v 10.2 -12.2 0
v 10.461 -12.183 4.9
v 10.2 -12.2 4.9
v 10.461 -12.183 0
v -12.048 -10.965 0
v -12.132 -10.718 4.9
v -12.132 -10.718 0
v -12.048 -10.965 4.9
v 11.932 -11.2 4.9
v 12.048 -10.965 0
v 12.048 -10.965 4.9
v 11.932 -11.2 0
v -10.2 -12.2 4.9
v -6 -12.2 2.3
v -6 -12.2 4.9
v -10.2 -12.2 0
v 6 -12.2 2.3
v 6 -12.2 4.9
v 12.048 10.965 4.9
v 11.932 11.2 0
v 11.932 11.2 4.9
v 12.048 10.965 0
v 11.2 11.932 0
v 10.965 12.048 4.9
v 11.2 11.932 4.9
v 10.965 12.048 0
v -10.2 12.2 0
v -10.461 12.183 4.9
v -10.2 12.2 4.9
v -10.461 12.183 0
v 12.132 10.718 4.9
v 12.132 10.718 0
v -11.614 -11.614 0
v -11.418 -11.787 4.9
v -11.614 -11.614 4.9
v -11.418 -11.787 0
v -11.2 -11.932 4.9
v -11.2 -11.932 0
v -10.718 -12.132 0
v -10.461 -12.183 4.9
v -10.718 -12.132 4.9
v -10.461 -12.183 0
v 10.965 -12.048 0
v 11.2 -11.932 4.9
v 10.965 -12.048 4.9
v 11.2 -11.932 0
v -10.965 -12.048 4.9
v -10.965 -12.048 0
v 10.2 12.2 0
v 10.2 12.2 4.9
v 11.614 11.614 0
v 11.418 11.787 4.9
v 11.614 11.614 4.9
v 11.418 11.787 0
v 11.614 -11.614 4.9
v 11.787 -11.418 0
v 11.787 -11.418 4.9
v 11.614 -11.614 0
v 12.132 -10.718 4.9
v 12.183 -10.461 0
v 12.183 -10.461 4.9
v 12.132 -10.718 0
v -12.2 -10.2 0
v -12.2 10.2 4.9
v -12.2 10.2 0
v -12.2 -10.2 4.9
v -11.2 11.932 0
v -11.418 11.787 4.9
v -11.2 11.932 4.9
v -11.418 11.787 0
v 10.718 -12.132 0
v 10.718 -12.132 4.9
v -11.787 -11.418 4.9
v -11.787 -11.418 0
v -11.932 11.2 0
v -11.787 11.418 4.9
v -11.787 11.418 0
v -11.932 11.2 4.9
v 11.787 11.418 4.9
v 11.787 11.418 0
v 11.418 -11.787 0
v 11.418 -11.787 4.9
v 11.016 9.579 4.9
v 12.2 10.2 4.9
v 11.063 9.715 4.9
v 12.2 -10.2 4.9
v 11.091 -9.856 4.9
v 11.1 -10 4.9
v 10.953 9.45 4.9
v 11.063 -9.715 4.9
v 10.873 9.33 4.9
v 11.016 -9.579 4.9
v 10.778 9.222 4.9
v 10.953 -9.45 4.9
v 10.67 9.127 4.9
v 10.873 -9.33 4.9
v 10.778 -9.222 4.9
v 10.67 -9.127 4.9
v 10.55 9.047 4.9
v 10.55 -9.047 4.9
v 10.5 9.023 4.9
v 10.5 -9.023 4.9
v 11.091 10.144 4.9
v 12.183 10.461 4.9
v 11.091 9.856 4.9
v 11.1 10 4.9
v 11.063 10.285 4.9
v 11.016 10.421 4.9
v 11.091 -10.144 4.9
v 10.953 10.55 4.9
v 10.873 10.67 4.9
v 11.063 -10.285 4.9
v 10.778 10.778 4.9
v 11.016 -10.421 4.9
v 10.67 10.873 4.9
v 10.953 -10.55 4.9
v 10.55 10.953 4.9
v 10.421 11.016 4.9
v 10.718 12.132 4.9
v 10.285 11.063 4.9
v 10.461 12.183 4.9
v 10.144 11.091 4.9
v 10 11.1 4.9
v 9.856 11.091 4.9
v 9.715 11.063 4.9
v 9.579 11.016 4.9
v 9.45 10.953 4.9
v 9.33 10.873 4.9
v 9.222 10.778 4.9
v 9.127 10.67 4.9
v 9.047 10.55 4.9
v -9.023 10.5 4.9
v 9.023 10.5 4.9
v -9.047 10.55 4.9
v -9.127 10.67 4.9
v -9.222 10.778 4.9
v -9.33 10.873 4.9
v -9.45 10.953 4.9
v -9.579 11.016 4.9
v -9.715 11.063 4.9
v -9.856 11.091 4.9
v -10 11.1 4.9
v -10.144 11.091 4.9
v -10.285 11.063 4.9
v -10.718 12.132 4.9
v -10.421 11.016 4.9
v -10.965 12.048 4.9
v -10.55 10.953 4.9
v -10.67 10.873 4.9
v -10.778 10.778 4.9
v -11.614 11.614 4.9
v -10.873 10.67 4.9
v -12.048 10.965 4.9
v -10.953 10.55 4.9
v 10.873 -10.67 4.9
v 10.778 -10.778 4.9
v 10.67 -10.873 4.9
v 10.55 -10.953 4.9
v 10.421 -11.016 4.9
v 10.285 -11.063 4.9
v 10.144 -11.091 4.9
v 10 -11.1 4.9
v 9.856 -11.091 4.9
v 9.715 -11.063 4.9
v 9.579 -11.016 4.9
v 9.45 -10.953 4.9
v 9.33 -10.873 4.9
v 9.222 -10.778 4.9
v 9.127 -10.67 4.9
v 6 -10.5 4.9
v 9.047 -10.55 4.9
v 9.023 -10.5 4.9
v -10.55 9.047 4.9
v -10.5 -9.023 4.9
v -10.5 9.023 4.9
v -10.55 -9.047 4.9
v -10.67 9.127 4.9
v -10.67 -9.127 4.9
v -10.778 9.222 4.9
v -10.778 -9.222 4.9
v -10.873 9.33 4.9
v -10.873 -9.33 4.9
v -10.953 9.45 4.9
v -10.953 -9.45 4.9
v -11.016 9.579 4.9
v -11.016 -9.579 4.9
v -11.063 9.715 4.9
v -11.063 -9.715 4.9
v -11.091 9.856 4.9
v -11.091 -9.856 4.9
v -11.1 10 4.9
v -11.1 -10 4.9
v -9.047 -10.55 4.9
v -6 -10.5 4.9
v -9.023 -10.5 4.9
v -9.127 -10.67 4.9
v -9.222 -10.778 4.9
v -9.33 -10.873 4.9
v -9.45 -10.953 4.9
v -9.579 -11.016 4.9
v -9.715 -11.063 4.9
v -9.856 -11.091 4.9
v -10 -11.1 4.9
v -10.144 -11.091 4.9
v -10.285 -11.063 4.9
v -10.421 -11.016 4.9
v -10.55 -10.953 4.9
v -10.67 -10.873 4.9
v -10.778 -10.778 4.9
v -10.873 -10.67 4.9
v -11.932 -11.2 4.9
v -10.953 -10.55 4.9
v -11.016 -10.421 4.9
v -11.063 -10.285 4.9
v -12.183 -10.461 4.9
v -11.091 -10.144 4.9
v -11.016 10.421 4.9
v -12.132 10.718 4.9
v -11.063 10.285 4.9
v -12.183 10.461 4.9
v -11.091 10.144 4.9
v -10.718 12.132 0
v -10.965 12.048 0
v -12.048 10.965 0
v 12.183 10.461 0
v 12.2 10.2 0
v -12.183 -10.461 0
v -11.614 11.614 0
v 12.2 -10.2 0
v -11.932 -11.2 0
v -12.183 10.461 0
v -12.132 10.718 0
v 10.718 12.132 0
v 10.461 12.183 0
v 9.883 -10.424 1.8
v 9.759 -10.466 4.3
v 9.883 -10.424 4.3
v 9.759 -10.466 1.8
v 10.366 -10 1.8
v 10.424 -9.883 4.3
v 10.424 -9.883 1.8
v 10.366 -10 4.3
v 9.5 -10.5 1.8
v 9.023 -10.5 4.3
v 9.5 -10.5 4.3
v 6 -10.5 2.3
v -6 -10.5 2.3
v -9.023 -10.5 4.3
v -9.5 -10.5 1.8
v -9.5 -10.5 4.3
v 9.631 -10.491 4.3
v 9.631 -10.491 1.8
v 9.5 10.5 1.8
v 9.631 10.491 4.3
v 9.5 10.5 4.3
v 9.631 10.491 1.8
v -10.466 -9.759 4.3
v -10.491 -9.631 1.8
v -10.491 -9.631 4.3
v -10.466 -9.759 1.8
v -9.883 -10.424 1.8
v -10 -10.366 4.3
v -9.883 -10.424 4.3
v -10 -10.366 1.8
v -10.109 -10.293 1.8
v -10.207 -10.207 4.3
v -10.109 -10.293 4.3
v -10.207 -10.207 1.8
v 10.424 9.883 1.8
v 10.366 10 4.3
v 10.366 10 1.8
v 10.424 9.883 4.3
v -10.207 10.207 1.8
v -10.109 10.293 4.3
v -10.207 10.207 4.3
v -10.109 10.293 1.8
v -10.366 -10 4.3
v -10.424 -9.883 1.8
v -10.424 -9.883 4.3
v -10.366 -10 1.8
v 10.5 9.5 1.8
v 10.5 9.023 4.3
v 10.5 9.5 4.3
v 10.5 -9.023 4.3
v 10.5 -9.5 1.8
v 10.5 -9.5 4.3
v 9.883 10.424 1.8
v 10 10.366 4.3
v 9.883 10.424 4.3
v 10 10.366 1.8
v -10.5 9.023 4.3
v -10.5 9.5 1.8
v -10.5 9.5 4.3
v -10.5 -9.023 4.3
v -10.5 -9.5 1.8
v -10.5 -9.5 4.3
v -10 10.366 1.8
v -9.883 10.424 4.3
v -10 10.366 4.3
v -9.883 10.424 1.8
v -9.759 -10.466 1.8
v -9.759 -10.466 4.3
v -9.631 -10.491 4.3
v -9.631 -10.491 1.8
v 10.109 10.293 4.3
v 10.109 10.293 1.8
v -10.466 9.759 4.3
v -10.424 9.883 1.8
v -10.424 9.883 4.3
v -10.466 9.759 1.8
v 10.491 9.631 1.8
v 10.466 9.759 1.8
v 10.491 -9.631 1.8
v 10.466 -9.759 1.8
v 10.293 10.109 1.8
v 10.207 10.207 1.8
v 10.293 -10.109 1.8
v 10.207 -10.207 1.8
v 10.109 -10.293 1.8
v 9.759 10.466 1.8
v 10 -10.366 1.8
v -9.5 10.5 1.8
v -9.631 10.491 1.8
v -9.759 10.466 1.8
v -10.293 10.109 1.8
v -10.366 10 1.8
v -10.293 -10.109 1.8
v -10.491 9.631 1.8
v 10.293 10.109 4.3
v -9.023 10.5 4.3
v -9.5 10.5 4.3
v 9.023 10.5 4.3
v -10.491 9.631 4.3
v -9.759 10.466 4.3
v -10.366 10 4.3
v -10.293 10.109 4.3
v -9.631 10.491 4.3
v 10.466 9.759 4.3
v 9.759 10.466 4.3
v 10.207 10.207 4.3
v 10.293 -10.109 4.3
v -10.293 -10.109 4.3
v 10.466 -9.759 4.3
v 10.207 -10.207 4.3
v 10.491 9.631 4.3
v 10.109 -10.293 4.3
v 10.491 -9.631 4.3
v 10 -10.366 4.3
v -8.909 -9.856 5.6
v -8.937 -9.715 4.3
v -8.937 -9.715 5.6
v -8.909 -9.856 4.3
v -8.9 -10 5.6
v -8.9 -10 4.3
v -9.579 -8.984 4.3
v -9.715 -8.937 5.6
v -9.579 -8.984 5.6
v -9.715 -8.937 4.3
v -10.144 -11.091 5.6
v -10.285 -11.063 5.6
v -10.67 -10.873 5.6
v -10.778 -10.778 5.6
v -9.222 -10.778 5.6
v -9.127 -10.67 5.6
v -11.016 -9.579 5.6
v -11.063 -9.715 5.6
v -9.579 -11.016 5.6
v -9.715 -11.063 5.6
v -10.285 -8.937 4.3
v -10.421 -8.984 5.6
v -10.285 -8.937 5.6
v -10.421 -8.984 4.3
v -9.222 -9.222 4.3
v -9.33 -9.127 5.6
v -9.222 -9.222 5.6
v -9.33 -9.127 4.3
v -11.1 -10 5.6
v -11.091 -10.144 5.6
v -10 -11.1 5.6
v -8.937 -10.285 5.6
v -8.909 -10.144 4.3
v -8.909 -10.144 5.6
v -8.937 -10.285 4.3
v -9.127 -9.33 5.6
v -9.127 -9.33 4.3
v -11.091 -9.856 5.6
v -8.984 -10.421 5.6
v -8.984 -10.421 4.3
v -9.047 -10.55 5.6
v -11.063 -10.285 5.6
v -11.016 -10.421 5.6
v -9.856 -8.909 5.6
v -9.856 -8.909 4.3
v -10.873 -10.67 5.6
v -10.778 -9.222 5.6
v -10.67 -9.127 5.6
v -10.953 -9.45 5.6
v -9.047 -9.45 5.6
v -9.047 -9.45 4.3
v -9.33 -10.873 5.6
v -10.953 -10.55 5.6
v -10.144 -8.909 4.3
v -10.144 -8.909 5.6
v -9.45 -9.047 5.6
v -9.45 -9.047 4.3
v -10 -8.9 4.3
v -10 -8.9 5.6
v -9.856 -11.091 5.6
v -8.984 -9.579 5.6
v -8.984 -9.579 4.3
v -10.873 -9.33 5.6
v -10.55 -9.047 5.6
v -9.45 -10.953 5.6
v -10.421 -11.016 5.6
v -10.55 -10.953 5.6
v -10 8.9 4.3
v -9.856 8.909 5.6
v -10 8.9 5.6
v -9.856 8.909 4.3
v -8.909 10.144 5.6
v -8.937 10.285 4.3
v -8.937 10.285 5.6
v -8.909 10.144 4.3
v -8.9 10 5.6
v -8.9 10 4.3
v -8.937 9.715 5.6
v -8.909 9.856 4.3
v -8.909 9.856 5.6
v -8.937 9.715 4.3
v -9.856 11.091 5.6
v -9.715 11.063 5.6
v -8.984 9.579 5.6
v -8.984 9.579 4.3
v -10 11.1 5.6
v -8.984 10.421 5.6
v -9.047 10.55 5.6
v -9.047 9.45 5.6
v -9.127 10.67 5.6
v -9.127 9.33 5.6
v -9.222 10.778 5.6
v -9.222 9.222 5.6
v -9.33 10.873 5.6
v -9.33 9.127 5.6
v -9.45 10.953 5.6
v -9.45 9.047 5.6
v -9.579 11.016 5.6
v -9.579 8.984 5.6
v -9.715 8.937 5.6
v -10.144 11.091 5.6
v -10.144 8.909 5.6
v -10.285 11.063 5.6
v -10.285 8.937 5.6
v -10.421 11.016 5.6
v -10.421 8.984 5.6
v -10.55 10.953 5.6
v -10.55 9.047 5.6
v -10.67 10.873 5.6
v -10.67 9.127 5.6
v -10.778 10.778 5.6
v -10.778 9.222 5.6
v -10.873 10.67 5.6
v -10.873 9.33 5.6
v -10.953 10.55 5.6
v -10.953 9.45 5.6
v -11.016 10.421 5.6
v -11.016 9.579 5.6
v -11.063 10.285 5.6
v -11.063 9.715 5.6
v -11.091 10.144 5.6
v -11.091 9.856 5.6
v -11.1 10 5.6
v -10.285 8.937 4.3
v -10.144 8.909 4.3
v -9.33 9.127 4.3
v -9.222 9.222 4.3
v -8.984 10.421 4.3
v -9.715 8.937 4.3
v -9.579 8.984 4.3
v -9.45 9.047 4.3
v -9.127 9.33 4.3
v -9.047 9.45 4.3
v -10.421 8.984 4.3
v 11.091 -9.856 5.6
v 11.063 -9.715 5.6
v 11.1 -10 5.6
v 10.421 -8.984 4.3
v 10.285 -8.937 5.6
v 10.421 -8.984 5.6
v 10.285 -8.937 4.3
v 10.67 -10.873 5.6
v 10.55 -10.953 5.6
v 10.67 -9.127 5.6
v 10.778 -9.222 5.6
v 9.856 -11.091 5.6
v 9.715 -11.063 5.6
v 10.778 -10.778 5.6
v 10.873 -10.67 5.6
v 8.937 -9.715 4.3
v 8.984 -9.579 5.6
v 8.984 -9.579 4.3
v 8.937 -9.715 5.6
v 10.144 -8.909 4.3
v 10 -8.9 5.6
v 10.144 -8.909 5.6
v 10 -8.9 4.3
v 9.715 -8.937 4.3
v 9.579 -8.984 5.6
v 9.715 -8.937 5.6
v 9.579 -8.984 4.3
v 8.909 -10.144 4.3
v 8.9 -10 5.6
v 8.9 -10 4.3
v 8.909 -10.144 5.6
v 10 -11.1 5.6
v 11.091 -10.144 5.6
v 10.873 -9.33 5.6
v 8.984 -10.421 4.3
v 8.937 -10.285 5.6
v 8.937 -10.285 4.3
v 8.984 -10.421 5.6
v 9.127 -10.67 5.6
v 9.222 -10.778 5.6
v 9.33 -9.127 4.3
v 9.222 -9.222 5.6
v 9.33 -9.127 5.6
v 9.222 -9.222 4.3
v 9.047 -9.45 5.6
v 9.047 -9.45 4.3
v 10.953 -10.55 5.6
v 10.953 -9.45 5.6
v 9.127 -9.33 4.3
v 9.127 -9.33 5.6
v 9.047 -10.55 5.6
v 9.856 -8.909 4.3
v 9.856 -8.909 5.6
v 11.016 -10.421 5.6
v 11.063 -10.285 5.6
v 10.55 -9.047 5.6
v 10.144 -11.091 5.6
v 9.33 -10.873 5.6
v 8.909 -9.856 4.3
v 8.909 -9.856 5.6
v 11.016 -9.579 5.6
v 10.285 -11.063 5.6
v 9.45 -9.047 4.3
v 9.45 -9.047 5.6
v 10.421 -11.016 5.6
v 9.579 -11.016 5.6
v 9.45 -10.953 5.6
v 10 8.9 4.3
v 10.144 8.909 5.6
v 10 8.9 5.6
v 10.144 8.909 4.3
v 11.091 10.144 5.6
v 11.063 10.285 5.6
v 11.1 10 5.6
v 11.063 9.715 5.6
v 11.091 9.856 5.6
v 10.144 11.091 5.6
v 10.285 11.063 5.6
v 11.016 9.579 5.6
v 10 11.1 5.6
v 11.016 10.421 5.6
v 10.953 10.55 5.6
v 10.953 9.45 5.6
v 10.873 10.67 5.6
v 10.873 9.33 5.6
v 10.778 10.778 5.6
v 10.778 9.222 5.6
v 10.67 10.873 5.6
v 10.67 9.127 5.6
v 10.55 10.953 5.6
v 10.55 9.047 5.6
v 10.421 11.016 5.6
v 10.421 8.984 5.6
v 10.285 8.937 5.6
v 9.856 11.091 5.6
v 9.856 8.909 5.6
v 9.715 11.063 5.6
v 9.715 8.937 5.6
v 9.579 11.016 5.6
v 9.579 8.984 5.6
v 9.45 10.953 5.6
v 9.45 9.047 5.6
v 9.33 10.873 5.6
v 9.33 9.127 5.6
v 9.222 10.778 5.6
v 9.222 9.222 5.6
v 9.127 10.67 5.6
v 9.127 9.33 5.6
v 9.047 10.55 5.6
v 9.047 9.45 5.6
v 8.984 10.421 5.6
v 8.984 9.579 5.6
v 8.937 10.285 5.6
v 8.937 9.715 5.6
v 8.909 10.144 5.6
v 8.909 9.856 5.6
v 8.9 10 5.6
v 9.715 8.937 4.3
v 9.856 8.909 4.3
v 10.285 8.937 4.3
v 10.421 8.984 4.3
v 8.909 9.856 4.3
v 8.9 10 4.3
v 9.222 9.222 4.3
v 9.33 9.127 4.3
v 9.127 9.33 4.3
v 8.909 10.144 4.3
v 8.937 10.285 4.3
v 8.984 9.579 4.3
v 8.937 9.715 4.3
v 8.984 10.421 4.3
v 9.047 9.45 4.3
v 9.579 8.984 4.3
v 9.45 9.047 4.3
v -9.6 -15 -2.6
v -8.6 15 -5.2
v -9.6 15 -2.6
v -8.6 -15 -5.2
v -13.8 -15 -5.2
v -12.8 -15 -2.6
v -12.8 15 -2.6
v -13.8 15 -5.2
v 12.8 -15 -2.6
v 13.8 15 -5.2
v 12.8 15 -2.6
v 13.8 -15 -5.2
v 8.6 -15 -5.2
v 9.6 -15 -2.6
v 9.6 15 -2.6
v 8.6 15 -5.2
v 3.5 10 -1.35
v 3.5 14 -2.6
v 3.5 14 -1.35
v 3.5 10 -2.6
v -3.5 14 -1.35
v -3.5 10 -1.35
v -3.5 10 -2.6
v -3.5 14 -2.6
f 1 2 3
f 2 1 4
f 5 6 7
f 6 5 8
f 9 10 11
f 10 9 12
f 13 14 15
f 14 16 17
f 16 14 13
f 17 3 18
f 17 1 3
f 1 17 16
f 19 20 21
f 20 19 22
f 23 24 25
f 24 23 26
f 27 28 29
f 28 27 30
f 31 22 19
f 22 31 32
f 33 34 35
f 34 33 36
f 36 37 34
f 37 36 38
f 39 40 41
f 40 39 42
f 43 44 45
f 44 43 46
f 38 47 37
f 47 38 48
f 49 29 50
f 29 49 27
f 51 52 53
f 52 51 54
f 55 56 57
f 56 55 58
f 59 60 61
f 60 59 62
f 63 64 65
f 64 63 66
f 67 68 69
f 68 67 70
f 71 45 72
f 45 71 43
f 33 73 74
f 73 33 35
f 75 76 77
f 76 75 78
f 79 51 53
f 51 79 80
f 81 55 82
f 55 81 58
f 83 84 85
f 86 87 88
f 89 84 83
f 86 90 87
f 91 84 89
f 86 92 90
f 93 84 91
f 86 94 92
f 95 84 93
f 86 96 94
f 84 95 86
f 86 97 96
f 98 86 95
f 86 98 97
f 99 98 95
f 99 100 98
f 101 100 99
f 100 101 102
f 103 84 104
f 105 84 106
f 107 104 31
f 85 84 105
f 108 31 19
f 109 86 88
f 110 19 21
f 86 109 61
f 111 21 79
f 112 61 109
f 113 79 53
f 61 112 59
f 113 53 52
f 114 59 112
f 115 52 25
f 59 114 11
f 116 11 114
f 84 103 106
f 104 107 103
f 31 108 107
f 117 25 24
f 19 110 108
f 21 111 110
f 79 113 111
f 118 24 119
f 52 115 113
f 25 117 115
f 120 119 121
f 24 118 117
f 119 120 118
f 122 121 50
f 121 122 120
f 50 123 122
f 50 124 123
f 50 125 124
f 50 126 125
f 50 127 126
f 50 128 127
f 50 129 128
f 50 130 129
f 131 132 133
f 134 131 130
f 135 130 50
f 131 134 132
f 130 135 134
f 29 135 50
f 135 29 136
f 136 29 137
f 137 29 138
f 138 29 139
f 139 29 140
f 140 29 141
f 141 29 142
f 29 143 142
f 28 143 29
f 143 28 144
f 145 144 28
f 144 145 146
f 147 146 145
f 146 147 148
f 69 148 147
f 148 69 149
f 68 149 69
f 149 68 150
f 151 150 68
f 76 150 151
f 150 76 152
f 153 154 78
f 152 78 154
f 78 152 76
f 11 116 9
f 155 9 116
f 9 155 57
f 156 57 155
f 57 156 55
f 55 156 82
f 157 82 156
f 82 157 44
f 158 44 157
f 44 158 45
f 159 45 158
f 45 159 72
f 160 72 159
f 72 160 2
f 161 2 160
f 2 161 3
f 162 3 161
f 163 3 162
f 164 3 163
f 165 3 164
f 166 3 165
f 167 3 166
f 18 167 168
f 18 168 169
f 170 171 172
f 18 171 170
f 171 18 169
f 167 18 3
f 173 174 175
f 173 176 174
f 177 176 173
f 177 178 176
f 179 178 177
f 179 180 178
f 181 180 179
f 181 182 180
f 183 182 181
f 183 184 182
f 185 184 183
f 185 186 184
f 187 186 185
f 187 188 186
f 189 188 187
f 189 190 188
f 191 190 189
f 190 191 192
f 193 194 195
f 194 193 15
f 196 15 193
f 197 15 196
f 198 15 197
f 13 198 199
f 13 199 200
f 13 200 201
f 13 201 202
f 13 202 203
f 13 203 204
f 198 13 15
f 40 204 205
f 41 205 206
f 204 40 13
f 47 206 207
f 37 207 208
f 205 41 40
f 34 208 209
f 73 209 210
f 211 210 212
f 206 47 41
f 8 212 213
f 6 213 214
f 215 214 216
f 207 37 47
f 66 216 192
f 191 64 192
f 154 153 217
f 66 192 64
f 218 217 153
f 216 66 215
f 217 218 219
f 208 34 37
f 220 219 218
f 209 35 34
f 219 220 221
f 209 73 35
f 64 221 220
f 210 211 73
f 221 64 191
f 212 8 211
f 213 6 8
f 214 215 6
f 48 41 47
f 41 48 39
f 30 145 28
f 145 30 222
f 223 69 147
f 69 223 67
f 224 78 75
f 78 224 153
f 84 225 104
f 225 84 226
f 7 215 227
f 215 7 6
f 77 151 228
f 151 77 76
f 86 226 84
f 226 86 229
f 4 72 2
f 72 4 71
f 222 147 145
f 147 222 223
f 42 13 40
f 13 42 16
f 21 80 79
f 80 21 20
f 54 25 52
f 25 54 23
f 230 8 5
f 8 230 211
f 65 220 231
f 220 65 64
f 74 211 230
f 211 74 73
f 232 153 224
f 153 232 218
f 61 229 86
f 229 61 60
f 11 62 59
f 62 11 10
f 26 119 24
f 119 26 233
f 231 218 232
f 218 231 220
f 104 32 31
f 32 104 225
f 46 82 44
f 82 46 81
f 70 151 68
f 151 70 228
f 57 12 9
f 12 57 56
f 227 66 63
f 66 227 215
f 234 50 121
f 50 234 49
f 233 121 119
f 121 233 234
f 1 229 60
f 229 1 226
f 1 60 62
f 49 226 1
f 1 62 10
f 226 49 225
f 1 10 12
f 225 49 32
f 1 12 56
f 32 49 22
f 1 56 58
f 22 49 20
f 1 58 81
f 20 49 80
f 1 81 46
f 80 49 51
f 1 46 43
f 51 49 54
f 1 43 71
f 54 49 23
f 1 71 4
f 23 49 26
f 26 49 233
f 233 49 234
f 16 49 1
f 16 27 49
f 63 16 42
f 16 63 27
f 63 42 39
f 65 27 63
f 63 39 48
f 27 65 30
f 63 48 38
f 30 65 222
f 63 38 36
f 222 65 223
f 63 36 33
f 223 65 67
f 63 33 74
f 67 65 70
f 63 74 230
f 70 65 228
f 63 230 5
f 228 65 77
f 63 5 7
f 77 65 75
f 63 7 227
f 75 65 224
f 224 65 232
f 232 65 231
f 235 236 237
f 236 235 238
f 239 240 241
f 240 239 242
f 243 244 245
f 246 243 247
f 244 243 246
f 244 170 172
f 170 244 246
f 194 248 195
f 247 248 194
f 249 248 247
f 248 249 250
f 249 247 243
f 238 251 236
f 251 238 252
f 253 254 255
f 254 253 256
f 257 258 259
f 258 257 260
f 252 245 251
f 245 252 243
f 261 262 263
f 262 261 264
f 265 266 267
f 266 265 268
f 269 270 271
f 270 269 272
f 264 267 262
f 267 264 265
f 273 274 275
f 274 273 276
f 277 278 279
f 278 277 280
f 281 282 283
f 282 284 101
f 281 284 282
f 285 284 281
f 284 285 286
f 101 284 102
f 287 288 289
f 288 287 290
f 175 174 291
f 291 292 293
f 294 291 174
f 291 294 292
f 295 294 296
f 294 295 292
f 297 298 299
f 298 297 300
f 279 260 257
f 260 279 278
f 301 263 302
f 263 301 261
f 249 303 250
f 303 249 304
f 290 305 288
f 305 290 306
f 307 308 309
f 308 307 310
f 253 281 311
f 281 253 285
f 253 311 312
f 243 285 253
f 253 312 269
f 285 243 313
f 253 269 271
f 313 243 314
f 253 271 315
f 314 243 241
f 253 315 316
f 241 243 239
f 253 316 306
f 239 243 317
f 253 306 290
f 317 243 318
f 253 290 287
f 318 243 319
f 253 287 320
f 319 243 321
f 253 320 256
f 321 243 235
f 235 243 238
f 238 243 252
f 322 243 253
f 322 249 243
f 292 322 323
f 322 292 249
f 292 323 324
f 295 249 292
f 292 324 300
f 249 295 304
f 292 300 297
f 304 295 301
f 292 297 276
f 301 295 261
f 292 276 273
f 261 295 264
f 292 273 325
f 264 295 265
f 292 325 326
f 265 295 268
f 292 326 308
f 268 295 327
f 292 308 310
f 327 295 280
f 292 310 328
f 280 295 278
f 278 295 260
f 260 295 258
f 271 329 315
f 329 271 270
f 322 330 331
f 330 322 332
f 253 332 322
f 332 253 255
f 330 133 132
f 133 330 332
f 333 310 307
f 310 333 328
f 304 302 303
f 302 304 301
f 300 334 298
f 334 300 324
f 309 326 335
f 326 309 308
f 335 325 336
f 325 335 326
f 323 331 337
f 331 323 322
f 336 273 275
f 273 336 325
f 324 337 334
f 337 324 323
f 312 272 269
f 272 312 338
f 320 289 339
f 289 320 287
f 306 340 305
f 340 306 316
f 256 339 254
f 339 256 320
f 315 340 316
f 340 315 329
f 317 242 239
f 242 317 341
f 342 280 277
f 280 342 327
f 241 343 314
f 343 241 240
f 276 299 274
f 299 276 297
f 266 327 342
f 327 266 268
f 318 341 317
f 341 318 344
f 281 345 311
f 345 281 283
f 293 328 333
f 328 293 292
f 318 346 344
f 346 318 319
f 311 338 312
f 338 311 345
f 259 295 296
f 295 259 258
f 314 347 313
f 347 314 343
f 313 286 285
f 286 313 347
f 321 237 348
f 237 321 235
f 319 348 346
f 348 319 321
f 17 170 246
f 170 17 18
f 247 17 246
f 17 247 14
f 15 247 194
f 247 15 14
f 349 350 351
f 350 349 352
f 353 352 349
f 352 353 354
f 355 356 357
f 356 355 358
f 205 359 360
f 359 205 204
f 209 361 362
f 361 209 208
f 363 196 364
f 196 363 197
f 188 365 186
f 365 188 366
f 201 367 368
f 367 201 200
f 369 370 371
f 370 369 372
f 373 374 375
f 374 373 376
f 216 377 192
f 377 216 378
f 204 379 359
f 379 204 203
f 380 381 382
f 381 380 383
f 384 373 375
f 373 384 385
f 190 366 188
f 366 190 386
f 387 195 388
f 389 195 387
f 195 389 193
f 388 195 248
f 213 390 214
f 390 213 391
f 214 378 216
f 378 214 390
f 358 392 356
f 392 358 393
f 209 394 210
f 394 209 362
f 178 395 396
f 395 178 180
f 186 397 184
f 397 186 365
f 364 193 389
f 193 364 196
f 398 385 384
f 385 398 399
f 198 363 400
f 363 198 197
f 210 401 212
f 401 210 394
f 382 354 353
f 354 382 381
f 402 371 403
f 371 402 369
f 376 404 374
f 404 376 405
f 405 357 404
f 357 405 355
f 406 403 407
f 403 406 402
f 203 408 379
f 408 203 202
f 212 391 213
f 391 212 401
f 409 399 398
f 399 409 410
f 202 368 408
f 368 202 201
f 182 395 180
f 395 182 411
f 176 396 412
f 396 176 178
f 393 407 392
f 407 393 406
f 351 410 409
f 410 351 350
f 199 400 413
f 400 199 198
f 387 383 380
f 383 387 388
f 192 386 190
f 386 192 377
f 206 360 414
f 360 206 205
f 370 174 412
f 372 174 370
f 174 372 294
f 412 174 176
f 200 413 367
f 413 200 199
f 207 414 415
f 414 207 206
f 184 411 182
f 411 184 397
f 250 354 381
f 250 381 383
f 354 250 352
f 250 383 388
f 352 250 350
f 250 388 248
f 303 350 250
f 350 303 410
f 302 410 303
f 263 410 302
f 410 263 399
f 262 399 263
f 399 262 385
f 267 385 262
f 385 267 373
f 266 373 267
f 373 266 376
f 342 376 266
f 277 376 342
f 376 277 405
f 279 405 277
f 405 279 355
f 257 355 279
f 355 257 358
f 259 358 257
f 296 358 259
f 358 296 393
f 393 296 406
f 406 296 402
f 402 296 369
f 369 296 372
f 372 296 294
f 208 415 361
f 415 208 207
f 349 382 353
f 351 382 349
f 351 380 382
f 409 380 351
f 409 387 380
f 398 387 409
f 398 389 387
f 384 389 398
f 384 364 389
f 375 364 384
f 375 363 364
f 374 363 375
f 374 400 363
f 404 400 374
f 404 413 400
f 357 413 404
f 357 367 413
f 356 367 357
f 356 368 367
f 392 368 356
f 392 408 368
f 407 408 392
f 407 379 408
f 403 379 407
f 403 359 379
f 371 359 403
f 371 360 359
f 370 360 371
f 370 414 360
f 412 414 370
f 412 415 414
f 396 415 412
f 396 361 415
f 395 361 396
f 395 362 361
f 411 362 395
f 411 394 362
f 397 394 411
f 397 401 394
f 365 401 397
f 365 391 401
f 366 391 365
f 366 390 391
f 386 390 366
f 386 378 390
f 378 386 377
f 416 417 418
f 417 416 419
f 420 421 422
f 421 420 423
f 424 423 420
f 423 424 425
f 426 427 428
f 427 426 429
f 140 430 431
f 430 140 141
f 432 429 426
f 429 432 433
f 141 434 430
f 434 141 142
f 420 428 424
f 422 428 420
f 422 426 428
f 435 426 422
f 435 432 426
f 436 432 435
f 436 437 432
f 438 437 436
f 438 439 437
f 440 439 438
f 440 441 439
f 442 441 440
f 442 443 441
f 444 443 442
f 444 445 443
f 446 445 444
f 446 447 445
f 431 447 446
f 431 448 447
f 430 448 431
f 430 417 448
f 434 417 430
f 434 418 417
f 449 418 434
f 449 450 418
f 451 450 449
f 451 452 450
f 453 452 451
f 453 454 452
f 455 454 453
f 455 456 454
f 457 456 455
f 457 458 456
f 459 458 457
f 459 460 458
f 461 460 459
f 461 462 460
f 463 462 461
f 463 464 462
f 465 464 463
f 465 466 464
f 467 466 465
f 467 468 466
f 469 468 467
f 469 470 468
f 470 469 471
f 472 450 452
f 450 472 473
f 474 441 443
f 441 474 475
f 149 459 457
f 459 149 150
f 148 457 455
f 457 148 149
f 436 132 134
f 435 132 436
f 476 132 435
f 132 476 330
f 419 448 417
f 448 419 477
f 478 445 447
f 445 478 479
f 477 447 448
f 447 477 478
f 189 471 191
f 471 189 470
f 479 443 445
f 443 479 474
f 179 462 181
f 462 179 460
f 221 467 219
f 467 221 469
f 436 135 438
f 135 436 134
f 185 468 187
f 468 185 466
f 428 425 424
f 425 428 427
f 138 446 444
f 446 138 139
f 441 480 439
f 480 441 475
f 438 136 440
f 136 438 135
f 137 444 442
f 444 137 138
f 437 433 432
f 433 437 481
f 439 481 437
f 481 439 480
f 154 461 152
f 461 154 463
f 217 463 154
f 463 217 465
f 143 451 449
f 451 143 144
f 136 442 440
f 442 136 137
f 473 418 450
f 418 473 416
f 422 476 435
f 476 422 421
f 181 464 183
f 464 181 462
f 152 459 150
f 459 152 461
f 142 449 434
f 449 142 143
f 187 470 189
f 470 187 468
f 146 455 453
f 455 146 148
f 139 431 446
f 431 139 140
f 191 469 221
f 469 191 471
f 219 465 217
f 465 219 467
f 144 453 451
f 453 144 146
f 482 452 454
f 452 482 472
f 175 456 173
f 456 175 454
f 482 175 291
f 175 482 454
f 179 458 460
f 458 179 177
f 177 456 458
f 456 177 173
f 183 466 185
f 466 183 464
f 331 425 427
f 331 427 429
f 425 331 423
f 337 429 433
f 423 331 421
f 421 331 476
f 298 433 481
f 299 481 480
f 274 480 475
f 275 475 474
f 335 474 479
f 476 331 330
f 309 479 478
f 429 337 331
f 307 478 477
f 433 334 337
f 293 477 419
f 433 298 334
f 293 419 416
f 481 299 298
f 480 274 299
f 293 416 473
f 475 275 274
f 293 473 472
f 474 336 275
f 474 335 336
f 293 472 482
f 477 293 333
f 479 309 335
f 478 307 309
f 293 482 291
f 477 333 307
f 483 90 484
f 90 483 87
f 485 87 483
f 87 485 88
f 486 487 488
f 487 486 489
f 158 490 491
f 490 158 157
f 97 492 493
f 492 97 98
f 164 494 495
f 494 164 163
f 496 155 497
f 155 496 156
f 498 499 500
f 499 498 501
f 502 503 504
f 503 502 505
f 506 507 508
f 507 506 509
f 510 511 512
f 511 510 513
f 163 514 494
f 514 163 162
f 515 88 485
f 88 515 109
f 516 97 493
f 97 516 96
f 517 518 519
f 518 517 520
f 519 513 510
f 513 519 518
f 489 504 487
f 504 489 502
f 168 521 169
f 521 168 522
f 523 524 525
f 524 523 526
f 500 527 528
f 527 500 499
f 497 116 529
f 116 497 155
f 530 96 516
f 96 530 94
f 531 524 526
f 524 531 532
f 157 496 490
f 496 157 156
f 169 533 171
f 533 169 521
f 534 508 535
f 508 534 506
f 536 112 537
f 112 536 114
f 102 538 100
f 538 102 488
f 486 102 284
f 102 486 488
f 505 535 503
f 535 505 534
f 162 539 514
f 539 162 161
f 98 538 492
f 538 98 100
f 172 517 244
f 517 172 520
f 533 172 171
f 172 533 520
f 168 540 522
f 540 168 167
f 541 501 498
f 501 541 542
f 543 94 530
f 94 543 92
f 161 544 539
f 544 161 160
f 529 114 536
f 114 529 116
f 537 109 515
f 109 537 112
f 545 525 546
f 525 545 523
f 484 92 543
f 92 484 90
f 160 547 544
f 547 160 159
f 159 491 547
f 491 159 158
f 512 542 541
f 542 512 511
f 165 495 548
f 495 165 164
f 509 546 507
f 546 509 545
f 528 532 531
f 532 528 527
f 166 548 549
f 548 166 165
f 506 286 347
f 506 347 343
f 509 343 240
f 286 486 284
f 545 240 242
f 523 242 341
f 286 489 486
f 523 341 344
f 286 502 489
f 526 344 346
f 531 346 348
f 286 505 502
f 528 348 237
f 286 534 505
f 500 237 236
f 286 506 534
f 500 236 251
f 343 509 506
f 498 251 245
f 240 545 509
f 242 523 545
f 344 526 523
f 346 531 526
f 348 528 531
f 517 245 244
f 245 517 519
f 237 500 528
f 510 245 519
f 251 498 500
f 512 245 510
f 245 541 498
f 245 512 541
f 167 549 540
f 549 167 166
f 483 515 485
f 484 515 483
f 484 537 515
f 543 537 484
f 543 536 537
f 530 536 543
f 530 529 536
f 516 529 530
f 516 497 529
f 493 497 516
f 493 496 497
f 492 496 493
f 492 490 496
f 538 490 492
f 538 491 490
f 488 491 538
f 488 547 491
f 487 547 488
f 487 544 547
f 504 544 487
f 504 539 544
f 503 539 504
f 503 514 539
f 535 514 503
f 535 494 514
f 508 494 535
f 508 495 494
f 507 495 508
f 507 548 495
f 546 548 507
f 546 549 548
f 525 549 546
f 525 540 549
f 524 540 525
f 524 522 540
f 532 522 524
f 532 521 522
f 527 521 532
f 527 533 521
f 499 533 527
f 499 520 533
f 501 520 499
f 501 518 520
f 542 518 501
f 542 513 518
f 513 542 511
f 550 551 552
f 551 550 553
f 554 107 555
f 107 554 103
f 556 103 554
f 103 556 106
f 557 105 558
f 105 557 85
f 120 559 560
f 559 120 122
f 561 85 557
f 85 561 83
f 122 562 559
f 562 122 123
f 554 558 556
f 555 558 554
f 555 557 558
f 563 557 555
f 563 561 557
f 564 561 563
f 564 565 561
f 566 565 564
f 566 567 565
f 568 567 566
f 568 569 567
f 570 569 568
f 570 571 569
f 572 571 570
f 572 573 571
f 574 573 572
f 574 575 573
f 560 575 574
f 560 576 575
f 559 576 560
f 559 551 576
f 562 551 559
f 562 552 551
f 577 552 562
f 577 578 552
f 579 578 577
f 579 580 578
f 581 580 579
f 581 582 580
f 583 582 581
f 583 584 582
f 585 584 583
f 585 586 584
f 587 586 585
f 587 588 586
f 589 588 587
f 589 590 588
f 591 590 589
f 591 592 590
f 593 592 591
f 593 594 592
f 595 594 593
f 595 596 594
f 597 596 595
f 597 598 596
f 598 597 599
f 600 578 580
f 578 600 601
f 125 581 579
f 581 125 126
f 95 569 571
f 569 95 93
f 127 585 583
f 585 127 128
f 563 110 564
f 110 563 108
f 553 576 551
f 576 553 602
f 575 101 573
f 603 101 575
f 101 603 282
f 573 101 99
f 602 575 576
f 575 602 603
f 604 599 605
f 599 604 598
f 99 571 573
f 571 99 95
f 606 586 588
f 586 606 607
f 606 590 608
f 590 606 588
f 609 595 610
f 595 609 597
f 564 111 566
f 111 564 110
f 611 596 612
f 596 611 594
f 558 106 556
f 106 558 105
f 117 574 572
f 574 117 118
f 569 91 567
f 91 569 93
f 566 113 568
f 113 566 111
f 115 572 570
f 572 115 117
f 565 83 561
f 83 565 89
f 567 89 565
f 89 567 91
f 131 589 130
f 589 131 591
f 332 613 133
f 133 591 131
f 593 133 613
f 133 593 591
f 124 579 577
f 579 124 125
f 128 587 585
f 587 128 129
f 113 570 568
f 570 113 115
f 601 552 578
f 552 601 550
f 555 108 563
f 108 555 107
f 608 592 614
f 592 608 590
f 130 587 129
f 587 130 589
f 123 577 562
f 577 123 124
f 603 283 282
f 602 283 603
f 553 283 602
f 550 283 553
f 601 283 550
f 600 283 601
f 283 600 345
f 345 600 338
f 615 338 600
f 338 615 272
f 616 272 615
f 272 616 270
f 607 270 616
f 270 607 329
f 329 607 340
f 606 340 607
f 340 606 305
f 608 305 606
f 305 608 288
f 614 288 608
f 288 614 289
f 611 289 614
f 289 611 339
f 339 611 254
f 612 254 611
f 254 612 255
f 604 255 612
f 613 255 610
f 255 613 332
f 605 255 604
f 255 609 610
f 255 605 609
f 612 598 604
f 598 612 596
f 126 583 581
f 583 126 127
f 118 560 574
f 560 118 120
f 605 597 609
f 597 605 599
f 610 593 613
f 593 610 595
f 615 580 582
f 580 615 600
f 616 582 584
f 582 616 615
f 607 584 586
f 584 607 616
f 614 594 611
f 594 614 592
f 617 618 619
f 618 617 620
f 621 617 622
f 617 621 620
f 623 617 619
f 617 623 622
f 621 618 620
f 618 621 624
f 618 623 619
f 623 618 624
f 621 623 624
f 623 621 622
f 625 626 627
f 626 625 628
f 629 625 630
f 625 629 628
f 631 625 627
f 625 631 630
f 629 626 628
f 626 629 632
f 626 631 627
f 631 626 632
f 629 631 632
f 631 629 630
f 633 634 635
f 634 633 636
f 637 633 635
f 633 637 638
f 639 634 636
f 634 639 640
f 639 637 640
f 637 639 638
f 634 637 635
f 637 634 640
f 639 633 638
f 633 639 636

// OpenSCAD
// file: rm_common.scad
// RobotMind Modular Ecosystem — common library
// Rev A concept for FDM prototyping, designed to migrate to injection molding.
$fn = 48;

// ---- Global mechanical interface ----
RM_DOCK_W = 30;
RM_DOCK_L = 34;
RM_DOCK_H = 5;
RM_RAIL_H = 2.6;
RM_RAIL_W = 3.2;
RM_RAIL_INSET = 3.8;
RM_CLEARANCE = 0.28;   // FDM sliding clearance per side
RM_LATCH_W = 7;
RM_LATCH_L = 9;
RM_LATCH_T = 1.6;
RM_LATCH_HOOK = 1.1;
RM_M3 = 3.3;

module rounded_box(size=[20,20,3], r=2, center=false) {
    x=size[0]; y=size[1]; z=size[2];
    translate(center ? [-x/2,-y/2,-z/2] : [0,0,0])
    linear_extrude(height=z)
      offset(r=r)
      offset(delta=-r)
      square([x,y]);
}

module slot2d(len=10, d=3) {
    hull(){
      translate([-len/2+d/2,0]) circle(d=d);
      translate([ len/2-d/2,0]) circle(d=d);
    }
}

// Male dovetail rail. The simplified trapezoid is robust in FDM and moldable.
module dovetail_rail(len=RM_DOCK_L-4, w=RM_RAIL_W, h=RM_RAIL_H) {
    linear_extrude(height=len)
      polygon(points=[[-w/2,0],[w/2,0],[w/2+1.0,h],[-w/2-1.0,h]]);
}

// Female channel cutter, slightly oversized.
module dovetail_channel(len=RM_DOCK_L, w=RM_RAIL_W+2*RM_CLEARANCE, h=RM_RAIL_H+RM_CLEARANCE) {
    linear_extrude(height=len)
      polygon(points=[[-w/2,0],[w/2,0],[w/2+1.15,h],[-w/2-1.15,h]]);
}

module male_interface() {
    // Interface origin centered X/Y, bottom at Z=0.
    for (sx=[-1,1])
      translate([sx*(RM_DOCK_W/2-RM_RAIL_INSET), -RM_DOCK_L/2+2, 0])
        rotate([-90,0,0]) dovetail_rail();
    // central catch boss engaged by dock latch
    translate([-RM_LATCH_W/2, RM_DOCK_L/2-7, 0])
      cube([RM_LATCH_W,4,1.25]);
}

module dock_body_base() {
    difference(){
      rounded_box([RM_DOCK_W,RM_DOCK_L,RM_DOCK_H],2.2,center=true);
      // open female dovetails from insertion side
      for (sx=[-1,1])
        translate([sx*(RM_DOCK_W/2-RM_RAIL_INSET), -RM_DOCK_L/2-0.2, -RM_DOCK_H/2+1.1])
          rotate([-90,0,0]) dovetail_channel(len=RM_DOCK_L+1);
      // four M3 mounting holes
      for(x=[-10.5,10.5], y=[-12,12]) translate([x,y,0]) cylinder(h=RM_DOCK_H+2,d=RM_M3,center=true);
      // latch relief window
      translate([-RM_LATCH_W/2-0.5, RM_DOCK_L/2-11, -RM_DOCK_H/2-0.1]) cube([RM_LATCH_W+1,11,RM_DOCK_H+1]);
    }
}

module latch_finger() {
    // flexible cantilever integrated at back of dock
    translate([-RM_LATCH_W/2, RM_DOCK_L/2-10, -RM_DOCK_H/2+0.7]) {
      cube([RM_LATCH_W,RM_LATCH_L,RM_LATCH_T]);
      translate([0,RM_LATCH_L-1.4,RM_LATCH_T]) cube([RM_LATCH_W,1.4,RM_LATCH_HOOK]);
      // thumb tab
      translate([-1.2,RM_LATCH_L-0.8,-0.2]) cube([RM_LATCH_W+2.4,3,RM_LATCH_T+0.4]);
    }
}

module universal_dock() {
    union(){ dock_body_base(); latch_finger(); }
}

module sensor_carrier(pcb=[20,20], wall=1.7, floor=1.8, clearance=0.5) {
    // carrier top tray centered; universal male interface below
    W=pcb[0]+2*(wall+clearance);
    L=pcb[1]+2*(wall+clearance);
    union(){
      translate([-W/2,-L/2,0]) difference(){
        rounded_box([W,L,floor+3.1],2);
        translate([wall,wall,floor]) rounded_box([pcb[0]+2*clearance,pcb[1]+2*clearance,5],1.0);
        // cable exit on front edge
        translate([W/2-6,-0.2,floor+0.5]) cube([12,wall+1,3.5]);
      }
      // small retention lips; gentle, printable snap
      for(x=[-W/2+2.2,W/2-2.2], y=[-L/2+2.2,L/2-2.2])
         translate([x,y,floor+2.5]) cylinder(h=1.3,d=2.2);
      translate([0,0,-RM_RAIL_H]) male_interface();
    }
}

module tag_insert(tag=[60,60], border=3.0, t=1.0, pulltab=true) {
    W=tag[0]+2*border; H=tag[1]+2*border;
    union(){
      translate([-W/2,-H/2,0]) rounded_box([W,H,t],1.2);
      if(pulltab) translate([-8,-H/2-4,0]) rounded_box([16,5,t],1.2);
    }
}

module tag_insert_rails(tag=[60,60], border=4, rail=1.5, depth=2.2) {
    W=tag[0]+2*border; H=tag[1]+2*border;
    // rails intended to capture tag insert edges
    for(sx=[-1,1]) translate([sx*(W/2-rail/2),0,0]) cube([rail,H,depth],center=true);
    translate([0,H/2-rail/2,0]) cube([W,rail,depth],center=true); // hard stop
}

module angle_wedge(angle=15, footprint=[RM_DOCK_W+4,RM_DOCK_L+4], min_h=3) {
    // solid wedge with top angled; child dock can be placed on top by caller
    W=footprint[0]; L=footprint[1]; dh=tan(angle)*L;
    polyhedron(points=[
      [-W/2,-L/2,0],[W/2,-L/2,0],[W/2,L/2,0],[-W/2,L/2,0],
      [-W/2,-L/2,min_h],[W/2,-L/2,min_h],[W/2,L/2,min_h+dh],[-W/2,L/2,min_h+dh]
    ], faces=[[0,1,2,3],[4,7,6,5],[0,4,5,1],[1,5,6,2],[2,6,7,3],[3,7,4,0]]);
}
// main file
include <rm_common.scad>
// Set SIZE to one of 0..4 before export.
SIZE = 0;
sizes=[[20,20],[20,40],[20,60],[40,40],[40,60]];
sensor_carrier(sizes[SIZE]);
